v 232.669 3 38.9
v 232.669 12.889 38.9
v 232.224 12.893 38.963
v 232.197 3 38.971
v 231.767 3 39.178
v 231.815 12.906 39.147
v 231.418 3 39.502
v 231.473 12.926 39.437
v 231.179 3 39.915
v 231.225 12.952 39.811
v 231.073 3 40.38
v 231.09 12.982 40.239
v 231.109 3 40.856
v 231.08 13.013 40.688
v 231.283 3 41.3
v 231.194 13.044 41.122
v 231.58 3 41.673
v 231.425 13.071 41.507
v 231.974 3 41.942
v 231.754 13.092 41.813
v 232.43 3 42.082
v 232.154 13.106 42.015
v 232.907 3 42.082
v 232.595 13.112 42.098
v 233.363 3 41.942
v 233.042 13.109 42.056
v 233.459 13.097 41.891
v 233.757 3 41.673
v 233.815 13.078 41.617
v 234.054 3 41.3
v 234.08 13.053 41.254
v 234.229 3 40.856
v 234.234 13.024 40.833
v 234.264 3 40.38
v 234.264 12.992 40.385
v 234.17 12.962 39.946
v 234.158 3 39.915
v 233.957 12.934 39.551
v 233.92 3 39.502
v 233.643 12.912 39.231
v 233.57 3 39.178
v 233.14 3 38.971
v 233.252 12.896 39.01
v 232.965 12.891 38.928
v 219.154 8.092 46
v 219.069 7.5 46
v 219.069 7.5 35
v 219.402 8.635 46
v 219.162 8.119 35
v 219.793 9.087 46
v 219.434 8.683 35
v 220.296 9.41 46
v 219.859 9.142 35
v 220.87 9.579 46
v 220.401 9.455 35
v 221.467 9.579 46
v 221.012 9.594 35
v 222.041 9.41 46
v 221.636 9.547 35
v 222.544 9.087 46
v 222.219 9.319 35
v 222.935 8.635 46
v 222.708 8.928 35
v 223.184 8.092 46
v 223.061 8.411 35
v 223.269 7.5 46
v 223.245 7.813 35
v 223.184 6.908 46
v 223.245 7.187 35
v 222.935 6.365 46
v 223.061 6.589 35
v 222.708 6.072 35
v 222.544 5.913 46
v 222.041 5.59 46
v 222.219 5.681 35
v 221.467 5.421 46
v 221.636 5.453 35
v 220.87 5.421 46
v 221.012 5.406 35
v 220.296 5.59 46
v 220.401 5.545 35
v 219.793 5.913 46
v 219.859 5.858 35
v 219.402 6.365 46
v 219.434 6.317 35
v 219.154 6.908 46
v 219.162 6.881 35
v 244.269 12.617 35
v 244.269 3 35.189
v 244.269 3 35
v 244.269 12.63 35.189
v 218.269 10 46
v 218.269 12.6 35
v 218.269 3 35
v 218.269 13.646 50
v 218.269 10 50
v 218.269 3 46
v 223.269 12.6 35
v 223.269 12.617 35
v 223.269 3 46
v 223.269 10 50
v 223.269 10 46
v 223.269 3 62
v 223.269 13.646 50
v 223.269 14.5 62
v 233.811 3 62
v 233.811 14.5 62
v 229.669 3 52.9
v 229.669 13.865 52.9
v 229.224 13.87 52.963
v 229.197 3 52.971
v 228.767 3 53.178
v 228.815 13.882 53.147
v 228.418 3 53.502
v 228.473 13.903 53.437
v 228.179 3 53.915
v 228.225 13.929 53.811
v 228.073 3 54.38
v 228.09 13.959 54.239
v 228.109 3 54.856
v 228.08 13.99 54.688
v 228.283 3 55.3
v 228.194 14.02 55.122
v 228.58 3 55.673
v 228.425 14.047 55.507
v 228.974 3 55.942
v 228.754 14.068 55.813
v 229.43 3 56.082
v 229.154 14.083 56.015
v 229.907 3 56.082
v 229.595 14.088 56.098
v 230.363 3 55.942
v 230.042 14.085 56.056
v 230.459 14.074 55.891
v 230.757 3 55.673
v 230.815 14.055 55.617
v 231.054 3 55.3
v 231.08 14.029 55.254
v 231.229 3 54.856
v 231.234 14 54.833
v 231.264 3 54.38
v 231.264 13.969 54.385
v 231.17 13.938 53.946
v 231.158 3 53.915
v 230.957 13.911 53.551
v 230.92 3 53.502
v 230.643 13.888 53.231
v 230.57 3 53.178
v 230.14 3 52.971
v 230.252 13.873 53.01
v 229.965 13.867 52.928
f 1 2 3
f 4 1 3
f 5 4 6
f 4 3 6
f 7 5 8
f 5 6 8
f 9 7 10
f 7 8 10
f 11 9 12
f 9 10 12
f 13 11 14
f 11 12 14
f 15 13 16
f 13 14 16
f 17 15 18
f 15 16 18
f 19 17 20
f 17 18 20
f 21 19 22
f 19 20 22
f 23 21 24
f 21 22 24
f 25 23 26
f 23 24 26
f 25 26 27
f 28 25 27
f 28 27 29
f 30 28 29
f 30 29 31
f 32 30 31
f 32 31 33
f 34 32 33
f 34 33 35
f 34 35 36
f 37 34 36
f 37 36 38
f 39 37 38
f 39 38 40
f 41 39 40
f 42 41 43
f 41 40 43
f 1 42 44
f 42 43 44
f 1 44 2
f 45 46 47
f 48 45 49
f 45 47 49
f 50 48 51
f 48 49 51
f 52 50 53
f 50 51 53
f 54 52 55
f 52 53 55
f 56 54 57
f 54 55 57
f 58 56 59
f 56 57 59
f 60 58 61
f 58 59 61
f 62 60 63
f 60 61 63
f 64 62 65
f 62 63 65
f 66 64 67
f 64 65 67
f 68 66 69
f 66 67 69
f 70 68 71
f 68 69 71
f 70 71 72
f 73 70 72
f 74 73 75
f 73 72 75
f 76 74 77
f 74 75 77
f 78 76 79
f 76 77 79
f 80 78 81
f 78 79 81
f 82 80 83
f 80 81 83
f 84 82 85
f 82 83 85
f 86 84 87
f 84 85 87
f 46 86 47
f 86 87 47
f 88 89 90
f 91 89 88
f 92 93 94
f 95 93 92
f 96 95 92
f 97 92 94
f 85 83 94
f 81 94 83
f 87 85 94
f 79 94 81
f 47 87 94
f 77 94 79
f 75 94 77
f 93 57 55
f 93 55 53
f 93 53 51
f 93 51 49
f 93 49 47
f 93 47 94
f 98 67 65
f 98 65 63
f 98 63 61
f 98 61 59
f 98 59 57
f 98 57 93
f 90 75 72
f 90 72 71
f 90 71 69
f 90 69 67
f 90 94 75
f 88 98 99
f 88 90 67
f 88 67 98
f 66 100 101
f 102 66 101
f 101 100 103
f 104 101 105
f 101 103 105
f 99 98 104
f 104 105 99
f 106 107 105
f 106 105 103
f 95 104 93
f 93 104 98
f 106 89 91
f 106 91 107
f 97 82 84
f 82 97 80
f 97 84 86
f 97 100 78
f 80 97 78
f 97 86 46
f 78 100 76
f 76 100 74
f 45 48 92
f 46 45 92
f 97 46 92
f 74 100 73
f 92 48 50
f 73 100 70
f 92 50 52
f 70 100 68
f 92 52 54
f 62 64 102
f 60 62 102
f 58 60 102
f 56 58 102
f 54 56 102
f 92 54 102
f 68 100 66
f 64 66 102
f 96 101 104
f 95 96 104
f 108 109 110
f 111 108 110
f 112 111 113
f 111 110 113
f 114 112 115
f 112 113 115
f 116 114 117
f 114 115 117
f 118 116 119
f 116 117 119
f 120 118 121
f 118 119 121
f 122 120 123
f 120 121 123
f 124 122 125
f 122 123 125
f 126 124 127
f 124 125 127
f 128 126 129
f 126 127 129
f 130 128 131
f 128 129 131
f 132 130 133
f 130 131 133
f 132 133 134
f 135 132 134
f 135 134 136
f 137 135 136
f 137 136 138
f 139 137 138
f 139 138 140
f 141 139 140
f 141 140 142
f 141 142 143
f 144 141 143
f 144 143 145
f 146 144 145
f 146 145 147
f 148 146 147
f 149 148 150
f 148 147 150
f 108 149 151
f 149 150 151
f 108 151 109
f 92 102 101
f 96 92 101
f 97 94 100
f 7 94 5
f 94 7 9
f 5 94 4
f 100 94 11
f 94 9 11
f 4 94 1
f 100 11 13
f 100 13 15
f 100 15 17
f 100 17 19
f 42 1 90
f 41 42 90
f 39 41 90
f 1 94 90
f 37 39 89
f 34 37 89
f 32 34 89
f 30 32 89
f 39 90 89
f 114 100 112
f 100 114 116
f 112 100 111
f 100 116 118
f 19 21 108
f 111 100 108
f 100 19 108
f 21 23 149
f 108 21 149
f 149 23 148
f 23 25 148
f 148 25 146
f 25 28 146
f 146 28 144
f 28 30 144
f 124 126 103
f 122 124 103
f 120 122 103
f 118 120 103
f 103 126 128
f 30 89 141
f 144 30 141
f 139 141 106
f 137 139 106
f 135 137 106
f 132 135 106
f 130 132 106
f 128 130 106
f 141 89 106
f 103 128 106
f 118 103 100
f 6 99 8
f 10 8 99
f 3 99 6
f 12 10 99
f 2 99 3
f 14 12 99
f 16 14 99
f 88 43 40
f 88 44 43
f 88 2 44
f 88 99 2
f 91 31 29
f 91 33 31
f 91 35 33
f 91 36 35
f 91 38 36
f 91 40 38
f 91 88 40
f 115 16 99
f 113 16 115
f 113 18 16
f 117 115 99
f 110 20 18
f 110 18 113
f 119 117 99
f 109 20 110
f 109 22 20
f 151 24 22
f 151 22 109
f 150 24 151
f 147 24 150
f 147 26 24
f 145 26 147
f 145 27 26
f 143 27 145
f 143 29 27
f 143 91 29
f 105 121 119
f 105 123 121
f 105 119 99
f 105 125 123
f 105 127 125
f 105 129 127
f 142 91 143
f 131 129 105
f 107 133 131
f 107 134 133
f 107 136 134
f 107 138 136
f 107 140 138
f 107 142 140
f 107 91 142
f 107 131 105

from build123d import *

# Parameters (mm, degrees)
CYLINDER127_R     = 1.6
CYLINDER127_DEPTH = 40
CYLINDER124_R     = 1.6
CYLINDER124_DEPTH = 40
CYLINDER181_R     = 2.1
CYLINDER181_DEPTH = 19
EXTRUDE067_DEPTH  = 5
EXTRUDE050_DEPTH  = 15
EXTRUDE049_DEPTH  = 21


with BuildPart() as cylinder127:
    # Cylinder127 → Cylinder127 (new body)
    with BuildSketch(Plane(origin=(5.3, 42, 40.5), x_dir=(0, 0, -1), z_dir=(0, -1, 0))):
        Circle(CYLINDER127_R)
    extrude(amount=CYLINDER127_DEPTH)


with BuildPart() as cylinder124:
    # Cylinder124 → Cylinder124 (new body)
    with BuildSketch(Plane(origin=(8.3, 42, 54.5), x_dir=(0, 0, -1), z_dir=(0, -1, 0))):
        Circle(CYLINDER124_R)
    extrude(amount=CYLINDER124_DEPTH)


with BuildPart() as cylinder181:
    # Cylinder181 → Cylinder181 (new body)
    with BuildSketch(Plane(origin=(16.8, 7.5, 32.7), x_dir=(1, 0, 0), z_dir=(0, 0, 1))):
        Circle(CYLINDER181_R)
    extrude(amount=CYLINDER181_DEPTH)


with BuildPart() as cut213:
    # Sketch055 → Extrude067 (new body)
    with BuildSketch(Plane.YZ):
        Polygon((3, 46), (10, 46), (10, 50), (13.646271, 50), (12.6, 35), (3, 35), align=None)
    extrude(amount=EXTRUDE067_DEPTH)


with BuildPart() as cut213_1:
    # Extrude067 placement: moved
    add(cut213.part.moved(Location((14.7, 0, 0))))

    # Cut213: cut Cylinder181
    add(cylinder181.part, mode=Mode.SUBTRACT)


with BuildPart() as extrude050:
    # Sketch040 → Extrude050 (new body)
    with BuildSketch(Plane.XZ):
        Polygon((-8.16038, 62.64716), (-8.16038, 30.419451), (4.410427, 62.64716), align=None)
    extrude(amount=-EXTRUDE050_DEPTH)


with BuildPart() as extrude050_1:
    # Extrude050 placement: moved
    add(extrude050.part.moved(Location((0, 1.5, 0))))


with BuildPart() as cut215:
    # Sketch039 → Extrude049 (new body)
    with BuildSketch(Plane.YZ):
        Polygon((3, 62), (3, 35), (12.616711, 35), (14.5, 62), align=None)
    extrude(amount=EXTRUDE049_DEPTH)


with BuildPart() as cut215_1:
    # Extrude049 placement: moved
    add(cut215.part.moved(Location((-6.3, 0, 0))))

    # Cut212: cut Extrude050
    add(extrude050_1.part, mode=Mode.SUBTRACT)

    # Fusion101: union Cut213
    add(cut213_1.part)

    # Cut214: cut Cylinder124
    add(cylinder124.part, mode=Mode.SUBTRACT)

    # Cut215: cut Cylinder127
    add(cylinder127.part, mode=Mode.SUBTRACT)


with BuildPart() as part_mirroring:
    # Part__Mirroring: instance of Cut215
    add(cut215_1.part.mirror(Plane(origin=(118.984314, 8.749394, 41.218285), x_dir=(0, -1, 0), z_dir=(1, 0, 0))))


solid = part_mirroring.part
